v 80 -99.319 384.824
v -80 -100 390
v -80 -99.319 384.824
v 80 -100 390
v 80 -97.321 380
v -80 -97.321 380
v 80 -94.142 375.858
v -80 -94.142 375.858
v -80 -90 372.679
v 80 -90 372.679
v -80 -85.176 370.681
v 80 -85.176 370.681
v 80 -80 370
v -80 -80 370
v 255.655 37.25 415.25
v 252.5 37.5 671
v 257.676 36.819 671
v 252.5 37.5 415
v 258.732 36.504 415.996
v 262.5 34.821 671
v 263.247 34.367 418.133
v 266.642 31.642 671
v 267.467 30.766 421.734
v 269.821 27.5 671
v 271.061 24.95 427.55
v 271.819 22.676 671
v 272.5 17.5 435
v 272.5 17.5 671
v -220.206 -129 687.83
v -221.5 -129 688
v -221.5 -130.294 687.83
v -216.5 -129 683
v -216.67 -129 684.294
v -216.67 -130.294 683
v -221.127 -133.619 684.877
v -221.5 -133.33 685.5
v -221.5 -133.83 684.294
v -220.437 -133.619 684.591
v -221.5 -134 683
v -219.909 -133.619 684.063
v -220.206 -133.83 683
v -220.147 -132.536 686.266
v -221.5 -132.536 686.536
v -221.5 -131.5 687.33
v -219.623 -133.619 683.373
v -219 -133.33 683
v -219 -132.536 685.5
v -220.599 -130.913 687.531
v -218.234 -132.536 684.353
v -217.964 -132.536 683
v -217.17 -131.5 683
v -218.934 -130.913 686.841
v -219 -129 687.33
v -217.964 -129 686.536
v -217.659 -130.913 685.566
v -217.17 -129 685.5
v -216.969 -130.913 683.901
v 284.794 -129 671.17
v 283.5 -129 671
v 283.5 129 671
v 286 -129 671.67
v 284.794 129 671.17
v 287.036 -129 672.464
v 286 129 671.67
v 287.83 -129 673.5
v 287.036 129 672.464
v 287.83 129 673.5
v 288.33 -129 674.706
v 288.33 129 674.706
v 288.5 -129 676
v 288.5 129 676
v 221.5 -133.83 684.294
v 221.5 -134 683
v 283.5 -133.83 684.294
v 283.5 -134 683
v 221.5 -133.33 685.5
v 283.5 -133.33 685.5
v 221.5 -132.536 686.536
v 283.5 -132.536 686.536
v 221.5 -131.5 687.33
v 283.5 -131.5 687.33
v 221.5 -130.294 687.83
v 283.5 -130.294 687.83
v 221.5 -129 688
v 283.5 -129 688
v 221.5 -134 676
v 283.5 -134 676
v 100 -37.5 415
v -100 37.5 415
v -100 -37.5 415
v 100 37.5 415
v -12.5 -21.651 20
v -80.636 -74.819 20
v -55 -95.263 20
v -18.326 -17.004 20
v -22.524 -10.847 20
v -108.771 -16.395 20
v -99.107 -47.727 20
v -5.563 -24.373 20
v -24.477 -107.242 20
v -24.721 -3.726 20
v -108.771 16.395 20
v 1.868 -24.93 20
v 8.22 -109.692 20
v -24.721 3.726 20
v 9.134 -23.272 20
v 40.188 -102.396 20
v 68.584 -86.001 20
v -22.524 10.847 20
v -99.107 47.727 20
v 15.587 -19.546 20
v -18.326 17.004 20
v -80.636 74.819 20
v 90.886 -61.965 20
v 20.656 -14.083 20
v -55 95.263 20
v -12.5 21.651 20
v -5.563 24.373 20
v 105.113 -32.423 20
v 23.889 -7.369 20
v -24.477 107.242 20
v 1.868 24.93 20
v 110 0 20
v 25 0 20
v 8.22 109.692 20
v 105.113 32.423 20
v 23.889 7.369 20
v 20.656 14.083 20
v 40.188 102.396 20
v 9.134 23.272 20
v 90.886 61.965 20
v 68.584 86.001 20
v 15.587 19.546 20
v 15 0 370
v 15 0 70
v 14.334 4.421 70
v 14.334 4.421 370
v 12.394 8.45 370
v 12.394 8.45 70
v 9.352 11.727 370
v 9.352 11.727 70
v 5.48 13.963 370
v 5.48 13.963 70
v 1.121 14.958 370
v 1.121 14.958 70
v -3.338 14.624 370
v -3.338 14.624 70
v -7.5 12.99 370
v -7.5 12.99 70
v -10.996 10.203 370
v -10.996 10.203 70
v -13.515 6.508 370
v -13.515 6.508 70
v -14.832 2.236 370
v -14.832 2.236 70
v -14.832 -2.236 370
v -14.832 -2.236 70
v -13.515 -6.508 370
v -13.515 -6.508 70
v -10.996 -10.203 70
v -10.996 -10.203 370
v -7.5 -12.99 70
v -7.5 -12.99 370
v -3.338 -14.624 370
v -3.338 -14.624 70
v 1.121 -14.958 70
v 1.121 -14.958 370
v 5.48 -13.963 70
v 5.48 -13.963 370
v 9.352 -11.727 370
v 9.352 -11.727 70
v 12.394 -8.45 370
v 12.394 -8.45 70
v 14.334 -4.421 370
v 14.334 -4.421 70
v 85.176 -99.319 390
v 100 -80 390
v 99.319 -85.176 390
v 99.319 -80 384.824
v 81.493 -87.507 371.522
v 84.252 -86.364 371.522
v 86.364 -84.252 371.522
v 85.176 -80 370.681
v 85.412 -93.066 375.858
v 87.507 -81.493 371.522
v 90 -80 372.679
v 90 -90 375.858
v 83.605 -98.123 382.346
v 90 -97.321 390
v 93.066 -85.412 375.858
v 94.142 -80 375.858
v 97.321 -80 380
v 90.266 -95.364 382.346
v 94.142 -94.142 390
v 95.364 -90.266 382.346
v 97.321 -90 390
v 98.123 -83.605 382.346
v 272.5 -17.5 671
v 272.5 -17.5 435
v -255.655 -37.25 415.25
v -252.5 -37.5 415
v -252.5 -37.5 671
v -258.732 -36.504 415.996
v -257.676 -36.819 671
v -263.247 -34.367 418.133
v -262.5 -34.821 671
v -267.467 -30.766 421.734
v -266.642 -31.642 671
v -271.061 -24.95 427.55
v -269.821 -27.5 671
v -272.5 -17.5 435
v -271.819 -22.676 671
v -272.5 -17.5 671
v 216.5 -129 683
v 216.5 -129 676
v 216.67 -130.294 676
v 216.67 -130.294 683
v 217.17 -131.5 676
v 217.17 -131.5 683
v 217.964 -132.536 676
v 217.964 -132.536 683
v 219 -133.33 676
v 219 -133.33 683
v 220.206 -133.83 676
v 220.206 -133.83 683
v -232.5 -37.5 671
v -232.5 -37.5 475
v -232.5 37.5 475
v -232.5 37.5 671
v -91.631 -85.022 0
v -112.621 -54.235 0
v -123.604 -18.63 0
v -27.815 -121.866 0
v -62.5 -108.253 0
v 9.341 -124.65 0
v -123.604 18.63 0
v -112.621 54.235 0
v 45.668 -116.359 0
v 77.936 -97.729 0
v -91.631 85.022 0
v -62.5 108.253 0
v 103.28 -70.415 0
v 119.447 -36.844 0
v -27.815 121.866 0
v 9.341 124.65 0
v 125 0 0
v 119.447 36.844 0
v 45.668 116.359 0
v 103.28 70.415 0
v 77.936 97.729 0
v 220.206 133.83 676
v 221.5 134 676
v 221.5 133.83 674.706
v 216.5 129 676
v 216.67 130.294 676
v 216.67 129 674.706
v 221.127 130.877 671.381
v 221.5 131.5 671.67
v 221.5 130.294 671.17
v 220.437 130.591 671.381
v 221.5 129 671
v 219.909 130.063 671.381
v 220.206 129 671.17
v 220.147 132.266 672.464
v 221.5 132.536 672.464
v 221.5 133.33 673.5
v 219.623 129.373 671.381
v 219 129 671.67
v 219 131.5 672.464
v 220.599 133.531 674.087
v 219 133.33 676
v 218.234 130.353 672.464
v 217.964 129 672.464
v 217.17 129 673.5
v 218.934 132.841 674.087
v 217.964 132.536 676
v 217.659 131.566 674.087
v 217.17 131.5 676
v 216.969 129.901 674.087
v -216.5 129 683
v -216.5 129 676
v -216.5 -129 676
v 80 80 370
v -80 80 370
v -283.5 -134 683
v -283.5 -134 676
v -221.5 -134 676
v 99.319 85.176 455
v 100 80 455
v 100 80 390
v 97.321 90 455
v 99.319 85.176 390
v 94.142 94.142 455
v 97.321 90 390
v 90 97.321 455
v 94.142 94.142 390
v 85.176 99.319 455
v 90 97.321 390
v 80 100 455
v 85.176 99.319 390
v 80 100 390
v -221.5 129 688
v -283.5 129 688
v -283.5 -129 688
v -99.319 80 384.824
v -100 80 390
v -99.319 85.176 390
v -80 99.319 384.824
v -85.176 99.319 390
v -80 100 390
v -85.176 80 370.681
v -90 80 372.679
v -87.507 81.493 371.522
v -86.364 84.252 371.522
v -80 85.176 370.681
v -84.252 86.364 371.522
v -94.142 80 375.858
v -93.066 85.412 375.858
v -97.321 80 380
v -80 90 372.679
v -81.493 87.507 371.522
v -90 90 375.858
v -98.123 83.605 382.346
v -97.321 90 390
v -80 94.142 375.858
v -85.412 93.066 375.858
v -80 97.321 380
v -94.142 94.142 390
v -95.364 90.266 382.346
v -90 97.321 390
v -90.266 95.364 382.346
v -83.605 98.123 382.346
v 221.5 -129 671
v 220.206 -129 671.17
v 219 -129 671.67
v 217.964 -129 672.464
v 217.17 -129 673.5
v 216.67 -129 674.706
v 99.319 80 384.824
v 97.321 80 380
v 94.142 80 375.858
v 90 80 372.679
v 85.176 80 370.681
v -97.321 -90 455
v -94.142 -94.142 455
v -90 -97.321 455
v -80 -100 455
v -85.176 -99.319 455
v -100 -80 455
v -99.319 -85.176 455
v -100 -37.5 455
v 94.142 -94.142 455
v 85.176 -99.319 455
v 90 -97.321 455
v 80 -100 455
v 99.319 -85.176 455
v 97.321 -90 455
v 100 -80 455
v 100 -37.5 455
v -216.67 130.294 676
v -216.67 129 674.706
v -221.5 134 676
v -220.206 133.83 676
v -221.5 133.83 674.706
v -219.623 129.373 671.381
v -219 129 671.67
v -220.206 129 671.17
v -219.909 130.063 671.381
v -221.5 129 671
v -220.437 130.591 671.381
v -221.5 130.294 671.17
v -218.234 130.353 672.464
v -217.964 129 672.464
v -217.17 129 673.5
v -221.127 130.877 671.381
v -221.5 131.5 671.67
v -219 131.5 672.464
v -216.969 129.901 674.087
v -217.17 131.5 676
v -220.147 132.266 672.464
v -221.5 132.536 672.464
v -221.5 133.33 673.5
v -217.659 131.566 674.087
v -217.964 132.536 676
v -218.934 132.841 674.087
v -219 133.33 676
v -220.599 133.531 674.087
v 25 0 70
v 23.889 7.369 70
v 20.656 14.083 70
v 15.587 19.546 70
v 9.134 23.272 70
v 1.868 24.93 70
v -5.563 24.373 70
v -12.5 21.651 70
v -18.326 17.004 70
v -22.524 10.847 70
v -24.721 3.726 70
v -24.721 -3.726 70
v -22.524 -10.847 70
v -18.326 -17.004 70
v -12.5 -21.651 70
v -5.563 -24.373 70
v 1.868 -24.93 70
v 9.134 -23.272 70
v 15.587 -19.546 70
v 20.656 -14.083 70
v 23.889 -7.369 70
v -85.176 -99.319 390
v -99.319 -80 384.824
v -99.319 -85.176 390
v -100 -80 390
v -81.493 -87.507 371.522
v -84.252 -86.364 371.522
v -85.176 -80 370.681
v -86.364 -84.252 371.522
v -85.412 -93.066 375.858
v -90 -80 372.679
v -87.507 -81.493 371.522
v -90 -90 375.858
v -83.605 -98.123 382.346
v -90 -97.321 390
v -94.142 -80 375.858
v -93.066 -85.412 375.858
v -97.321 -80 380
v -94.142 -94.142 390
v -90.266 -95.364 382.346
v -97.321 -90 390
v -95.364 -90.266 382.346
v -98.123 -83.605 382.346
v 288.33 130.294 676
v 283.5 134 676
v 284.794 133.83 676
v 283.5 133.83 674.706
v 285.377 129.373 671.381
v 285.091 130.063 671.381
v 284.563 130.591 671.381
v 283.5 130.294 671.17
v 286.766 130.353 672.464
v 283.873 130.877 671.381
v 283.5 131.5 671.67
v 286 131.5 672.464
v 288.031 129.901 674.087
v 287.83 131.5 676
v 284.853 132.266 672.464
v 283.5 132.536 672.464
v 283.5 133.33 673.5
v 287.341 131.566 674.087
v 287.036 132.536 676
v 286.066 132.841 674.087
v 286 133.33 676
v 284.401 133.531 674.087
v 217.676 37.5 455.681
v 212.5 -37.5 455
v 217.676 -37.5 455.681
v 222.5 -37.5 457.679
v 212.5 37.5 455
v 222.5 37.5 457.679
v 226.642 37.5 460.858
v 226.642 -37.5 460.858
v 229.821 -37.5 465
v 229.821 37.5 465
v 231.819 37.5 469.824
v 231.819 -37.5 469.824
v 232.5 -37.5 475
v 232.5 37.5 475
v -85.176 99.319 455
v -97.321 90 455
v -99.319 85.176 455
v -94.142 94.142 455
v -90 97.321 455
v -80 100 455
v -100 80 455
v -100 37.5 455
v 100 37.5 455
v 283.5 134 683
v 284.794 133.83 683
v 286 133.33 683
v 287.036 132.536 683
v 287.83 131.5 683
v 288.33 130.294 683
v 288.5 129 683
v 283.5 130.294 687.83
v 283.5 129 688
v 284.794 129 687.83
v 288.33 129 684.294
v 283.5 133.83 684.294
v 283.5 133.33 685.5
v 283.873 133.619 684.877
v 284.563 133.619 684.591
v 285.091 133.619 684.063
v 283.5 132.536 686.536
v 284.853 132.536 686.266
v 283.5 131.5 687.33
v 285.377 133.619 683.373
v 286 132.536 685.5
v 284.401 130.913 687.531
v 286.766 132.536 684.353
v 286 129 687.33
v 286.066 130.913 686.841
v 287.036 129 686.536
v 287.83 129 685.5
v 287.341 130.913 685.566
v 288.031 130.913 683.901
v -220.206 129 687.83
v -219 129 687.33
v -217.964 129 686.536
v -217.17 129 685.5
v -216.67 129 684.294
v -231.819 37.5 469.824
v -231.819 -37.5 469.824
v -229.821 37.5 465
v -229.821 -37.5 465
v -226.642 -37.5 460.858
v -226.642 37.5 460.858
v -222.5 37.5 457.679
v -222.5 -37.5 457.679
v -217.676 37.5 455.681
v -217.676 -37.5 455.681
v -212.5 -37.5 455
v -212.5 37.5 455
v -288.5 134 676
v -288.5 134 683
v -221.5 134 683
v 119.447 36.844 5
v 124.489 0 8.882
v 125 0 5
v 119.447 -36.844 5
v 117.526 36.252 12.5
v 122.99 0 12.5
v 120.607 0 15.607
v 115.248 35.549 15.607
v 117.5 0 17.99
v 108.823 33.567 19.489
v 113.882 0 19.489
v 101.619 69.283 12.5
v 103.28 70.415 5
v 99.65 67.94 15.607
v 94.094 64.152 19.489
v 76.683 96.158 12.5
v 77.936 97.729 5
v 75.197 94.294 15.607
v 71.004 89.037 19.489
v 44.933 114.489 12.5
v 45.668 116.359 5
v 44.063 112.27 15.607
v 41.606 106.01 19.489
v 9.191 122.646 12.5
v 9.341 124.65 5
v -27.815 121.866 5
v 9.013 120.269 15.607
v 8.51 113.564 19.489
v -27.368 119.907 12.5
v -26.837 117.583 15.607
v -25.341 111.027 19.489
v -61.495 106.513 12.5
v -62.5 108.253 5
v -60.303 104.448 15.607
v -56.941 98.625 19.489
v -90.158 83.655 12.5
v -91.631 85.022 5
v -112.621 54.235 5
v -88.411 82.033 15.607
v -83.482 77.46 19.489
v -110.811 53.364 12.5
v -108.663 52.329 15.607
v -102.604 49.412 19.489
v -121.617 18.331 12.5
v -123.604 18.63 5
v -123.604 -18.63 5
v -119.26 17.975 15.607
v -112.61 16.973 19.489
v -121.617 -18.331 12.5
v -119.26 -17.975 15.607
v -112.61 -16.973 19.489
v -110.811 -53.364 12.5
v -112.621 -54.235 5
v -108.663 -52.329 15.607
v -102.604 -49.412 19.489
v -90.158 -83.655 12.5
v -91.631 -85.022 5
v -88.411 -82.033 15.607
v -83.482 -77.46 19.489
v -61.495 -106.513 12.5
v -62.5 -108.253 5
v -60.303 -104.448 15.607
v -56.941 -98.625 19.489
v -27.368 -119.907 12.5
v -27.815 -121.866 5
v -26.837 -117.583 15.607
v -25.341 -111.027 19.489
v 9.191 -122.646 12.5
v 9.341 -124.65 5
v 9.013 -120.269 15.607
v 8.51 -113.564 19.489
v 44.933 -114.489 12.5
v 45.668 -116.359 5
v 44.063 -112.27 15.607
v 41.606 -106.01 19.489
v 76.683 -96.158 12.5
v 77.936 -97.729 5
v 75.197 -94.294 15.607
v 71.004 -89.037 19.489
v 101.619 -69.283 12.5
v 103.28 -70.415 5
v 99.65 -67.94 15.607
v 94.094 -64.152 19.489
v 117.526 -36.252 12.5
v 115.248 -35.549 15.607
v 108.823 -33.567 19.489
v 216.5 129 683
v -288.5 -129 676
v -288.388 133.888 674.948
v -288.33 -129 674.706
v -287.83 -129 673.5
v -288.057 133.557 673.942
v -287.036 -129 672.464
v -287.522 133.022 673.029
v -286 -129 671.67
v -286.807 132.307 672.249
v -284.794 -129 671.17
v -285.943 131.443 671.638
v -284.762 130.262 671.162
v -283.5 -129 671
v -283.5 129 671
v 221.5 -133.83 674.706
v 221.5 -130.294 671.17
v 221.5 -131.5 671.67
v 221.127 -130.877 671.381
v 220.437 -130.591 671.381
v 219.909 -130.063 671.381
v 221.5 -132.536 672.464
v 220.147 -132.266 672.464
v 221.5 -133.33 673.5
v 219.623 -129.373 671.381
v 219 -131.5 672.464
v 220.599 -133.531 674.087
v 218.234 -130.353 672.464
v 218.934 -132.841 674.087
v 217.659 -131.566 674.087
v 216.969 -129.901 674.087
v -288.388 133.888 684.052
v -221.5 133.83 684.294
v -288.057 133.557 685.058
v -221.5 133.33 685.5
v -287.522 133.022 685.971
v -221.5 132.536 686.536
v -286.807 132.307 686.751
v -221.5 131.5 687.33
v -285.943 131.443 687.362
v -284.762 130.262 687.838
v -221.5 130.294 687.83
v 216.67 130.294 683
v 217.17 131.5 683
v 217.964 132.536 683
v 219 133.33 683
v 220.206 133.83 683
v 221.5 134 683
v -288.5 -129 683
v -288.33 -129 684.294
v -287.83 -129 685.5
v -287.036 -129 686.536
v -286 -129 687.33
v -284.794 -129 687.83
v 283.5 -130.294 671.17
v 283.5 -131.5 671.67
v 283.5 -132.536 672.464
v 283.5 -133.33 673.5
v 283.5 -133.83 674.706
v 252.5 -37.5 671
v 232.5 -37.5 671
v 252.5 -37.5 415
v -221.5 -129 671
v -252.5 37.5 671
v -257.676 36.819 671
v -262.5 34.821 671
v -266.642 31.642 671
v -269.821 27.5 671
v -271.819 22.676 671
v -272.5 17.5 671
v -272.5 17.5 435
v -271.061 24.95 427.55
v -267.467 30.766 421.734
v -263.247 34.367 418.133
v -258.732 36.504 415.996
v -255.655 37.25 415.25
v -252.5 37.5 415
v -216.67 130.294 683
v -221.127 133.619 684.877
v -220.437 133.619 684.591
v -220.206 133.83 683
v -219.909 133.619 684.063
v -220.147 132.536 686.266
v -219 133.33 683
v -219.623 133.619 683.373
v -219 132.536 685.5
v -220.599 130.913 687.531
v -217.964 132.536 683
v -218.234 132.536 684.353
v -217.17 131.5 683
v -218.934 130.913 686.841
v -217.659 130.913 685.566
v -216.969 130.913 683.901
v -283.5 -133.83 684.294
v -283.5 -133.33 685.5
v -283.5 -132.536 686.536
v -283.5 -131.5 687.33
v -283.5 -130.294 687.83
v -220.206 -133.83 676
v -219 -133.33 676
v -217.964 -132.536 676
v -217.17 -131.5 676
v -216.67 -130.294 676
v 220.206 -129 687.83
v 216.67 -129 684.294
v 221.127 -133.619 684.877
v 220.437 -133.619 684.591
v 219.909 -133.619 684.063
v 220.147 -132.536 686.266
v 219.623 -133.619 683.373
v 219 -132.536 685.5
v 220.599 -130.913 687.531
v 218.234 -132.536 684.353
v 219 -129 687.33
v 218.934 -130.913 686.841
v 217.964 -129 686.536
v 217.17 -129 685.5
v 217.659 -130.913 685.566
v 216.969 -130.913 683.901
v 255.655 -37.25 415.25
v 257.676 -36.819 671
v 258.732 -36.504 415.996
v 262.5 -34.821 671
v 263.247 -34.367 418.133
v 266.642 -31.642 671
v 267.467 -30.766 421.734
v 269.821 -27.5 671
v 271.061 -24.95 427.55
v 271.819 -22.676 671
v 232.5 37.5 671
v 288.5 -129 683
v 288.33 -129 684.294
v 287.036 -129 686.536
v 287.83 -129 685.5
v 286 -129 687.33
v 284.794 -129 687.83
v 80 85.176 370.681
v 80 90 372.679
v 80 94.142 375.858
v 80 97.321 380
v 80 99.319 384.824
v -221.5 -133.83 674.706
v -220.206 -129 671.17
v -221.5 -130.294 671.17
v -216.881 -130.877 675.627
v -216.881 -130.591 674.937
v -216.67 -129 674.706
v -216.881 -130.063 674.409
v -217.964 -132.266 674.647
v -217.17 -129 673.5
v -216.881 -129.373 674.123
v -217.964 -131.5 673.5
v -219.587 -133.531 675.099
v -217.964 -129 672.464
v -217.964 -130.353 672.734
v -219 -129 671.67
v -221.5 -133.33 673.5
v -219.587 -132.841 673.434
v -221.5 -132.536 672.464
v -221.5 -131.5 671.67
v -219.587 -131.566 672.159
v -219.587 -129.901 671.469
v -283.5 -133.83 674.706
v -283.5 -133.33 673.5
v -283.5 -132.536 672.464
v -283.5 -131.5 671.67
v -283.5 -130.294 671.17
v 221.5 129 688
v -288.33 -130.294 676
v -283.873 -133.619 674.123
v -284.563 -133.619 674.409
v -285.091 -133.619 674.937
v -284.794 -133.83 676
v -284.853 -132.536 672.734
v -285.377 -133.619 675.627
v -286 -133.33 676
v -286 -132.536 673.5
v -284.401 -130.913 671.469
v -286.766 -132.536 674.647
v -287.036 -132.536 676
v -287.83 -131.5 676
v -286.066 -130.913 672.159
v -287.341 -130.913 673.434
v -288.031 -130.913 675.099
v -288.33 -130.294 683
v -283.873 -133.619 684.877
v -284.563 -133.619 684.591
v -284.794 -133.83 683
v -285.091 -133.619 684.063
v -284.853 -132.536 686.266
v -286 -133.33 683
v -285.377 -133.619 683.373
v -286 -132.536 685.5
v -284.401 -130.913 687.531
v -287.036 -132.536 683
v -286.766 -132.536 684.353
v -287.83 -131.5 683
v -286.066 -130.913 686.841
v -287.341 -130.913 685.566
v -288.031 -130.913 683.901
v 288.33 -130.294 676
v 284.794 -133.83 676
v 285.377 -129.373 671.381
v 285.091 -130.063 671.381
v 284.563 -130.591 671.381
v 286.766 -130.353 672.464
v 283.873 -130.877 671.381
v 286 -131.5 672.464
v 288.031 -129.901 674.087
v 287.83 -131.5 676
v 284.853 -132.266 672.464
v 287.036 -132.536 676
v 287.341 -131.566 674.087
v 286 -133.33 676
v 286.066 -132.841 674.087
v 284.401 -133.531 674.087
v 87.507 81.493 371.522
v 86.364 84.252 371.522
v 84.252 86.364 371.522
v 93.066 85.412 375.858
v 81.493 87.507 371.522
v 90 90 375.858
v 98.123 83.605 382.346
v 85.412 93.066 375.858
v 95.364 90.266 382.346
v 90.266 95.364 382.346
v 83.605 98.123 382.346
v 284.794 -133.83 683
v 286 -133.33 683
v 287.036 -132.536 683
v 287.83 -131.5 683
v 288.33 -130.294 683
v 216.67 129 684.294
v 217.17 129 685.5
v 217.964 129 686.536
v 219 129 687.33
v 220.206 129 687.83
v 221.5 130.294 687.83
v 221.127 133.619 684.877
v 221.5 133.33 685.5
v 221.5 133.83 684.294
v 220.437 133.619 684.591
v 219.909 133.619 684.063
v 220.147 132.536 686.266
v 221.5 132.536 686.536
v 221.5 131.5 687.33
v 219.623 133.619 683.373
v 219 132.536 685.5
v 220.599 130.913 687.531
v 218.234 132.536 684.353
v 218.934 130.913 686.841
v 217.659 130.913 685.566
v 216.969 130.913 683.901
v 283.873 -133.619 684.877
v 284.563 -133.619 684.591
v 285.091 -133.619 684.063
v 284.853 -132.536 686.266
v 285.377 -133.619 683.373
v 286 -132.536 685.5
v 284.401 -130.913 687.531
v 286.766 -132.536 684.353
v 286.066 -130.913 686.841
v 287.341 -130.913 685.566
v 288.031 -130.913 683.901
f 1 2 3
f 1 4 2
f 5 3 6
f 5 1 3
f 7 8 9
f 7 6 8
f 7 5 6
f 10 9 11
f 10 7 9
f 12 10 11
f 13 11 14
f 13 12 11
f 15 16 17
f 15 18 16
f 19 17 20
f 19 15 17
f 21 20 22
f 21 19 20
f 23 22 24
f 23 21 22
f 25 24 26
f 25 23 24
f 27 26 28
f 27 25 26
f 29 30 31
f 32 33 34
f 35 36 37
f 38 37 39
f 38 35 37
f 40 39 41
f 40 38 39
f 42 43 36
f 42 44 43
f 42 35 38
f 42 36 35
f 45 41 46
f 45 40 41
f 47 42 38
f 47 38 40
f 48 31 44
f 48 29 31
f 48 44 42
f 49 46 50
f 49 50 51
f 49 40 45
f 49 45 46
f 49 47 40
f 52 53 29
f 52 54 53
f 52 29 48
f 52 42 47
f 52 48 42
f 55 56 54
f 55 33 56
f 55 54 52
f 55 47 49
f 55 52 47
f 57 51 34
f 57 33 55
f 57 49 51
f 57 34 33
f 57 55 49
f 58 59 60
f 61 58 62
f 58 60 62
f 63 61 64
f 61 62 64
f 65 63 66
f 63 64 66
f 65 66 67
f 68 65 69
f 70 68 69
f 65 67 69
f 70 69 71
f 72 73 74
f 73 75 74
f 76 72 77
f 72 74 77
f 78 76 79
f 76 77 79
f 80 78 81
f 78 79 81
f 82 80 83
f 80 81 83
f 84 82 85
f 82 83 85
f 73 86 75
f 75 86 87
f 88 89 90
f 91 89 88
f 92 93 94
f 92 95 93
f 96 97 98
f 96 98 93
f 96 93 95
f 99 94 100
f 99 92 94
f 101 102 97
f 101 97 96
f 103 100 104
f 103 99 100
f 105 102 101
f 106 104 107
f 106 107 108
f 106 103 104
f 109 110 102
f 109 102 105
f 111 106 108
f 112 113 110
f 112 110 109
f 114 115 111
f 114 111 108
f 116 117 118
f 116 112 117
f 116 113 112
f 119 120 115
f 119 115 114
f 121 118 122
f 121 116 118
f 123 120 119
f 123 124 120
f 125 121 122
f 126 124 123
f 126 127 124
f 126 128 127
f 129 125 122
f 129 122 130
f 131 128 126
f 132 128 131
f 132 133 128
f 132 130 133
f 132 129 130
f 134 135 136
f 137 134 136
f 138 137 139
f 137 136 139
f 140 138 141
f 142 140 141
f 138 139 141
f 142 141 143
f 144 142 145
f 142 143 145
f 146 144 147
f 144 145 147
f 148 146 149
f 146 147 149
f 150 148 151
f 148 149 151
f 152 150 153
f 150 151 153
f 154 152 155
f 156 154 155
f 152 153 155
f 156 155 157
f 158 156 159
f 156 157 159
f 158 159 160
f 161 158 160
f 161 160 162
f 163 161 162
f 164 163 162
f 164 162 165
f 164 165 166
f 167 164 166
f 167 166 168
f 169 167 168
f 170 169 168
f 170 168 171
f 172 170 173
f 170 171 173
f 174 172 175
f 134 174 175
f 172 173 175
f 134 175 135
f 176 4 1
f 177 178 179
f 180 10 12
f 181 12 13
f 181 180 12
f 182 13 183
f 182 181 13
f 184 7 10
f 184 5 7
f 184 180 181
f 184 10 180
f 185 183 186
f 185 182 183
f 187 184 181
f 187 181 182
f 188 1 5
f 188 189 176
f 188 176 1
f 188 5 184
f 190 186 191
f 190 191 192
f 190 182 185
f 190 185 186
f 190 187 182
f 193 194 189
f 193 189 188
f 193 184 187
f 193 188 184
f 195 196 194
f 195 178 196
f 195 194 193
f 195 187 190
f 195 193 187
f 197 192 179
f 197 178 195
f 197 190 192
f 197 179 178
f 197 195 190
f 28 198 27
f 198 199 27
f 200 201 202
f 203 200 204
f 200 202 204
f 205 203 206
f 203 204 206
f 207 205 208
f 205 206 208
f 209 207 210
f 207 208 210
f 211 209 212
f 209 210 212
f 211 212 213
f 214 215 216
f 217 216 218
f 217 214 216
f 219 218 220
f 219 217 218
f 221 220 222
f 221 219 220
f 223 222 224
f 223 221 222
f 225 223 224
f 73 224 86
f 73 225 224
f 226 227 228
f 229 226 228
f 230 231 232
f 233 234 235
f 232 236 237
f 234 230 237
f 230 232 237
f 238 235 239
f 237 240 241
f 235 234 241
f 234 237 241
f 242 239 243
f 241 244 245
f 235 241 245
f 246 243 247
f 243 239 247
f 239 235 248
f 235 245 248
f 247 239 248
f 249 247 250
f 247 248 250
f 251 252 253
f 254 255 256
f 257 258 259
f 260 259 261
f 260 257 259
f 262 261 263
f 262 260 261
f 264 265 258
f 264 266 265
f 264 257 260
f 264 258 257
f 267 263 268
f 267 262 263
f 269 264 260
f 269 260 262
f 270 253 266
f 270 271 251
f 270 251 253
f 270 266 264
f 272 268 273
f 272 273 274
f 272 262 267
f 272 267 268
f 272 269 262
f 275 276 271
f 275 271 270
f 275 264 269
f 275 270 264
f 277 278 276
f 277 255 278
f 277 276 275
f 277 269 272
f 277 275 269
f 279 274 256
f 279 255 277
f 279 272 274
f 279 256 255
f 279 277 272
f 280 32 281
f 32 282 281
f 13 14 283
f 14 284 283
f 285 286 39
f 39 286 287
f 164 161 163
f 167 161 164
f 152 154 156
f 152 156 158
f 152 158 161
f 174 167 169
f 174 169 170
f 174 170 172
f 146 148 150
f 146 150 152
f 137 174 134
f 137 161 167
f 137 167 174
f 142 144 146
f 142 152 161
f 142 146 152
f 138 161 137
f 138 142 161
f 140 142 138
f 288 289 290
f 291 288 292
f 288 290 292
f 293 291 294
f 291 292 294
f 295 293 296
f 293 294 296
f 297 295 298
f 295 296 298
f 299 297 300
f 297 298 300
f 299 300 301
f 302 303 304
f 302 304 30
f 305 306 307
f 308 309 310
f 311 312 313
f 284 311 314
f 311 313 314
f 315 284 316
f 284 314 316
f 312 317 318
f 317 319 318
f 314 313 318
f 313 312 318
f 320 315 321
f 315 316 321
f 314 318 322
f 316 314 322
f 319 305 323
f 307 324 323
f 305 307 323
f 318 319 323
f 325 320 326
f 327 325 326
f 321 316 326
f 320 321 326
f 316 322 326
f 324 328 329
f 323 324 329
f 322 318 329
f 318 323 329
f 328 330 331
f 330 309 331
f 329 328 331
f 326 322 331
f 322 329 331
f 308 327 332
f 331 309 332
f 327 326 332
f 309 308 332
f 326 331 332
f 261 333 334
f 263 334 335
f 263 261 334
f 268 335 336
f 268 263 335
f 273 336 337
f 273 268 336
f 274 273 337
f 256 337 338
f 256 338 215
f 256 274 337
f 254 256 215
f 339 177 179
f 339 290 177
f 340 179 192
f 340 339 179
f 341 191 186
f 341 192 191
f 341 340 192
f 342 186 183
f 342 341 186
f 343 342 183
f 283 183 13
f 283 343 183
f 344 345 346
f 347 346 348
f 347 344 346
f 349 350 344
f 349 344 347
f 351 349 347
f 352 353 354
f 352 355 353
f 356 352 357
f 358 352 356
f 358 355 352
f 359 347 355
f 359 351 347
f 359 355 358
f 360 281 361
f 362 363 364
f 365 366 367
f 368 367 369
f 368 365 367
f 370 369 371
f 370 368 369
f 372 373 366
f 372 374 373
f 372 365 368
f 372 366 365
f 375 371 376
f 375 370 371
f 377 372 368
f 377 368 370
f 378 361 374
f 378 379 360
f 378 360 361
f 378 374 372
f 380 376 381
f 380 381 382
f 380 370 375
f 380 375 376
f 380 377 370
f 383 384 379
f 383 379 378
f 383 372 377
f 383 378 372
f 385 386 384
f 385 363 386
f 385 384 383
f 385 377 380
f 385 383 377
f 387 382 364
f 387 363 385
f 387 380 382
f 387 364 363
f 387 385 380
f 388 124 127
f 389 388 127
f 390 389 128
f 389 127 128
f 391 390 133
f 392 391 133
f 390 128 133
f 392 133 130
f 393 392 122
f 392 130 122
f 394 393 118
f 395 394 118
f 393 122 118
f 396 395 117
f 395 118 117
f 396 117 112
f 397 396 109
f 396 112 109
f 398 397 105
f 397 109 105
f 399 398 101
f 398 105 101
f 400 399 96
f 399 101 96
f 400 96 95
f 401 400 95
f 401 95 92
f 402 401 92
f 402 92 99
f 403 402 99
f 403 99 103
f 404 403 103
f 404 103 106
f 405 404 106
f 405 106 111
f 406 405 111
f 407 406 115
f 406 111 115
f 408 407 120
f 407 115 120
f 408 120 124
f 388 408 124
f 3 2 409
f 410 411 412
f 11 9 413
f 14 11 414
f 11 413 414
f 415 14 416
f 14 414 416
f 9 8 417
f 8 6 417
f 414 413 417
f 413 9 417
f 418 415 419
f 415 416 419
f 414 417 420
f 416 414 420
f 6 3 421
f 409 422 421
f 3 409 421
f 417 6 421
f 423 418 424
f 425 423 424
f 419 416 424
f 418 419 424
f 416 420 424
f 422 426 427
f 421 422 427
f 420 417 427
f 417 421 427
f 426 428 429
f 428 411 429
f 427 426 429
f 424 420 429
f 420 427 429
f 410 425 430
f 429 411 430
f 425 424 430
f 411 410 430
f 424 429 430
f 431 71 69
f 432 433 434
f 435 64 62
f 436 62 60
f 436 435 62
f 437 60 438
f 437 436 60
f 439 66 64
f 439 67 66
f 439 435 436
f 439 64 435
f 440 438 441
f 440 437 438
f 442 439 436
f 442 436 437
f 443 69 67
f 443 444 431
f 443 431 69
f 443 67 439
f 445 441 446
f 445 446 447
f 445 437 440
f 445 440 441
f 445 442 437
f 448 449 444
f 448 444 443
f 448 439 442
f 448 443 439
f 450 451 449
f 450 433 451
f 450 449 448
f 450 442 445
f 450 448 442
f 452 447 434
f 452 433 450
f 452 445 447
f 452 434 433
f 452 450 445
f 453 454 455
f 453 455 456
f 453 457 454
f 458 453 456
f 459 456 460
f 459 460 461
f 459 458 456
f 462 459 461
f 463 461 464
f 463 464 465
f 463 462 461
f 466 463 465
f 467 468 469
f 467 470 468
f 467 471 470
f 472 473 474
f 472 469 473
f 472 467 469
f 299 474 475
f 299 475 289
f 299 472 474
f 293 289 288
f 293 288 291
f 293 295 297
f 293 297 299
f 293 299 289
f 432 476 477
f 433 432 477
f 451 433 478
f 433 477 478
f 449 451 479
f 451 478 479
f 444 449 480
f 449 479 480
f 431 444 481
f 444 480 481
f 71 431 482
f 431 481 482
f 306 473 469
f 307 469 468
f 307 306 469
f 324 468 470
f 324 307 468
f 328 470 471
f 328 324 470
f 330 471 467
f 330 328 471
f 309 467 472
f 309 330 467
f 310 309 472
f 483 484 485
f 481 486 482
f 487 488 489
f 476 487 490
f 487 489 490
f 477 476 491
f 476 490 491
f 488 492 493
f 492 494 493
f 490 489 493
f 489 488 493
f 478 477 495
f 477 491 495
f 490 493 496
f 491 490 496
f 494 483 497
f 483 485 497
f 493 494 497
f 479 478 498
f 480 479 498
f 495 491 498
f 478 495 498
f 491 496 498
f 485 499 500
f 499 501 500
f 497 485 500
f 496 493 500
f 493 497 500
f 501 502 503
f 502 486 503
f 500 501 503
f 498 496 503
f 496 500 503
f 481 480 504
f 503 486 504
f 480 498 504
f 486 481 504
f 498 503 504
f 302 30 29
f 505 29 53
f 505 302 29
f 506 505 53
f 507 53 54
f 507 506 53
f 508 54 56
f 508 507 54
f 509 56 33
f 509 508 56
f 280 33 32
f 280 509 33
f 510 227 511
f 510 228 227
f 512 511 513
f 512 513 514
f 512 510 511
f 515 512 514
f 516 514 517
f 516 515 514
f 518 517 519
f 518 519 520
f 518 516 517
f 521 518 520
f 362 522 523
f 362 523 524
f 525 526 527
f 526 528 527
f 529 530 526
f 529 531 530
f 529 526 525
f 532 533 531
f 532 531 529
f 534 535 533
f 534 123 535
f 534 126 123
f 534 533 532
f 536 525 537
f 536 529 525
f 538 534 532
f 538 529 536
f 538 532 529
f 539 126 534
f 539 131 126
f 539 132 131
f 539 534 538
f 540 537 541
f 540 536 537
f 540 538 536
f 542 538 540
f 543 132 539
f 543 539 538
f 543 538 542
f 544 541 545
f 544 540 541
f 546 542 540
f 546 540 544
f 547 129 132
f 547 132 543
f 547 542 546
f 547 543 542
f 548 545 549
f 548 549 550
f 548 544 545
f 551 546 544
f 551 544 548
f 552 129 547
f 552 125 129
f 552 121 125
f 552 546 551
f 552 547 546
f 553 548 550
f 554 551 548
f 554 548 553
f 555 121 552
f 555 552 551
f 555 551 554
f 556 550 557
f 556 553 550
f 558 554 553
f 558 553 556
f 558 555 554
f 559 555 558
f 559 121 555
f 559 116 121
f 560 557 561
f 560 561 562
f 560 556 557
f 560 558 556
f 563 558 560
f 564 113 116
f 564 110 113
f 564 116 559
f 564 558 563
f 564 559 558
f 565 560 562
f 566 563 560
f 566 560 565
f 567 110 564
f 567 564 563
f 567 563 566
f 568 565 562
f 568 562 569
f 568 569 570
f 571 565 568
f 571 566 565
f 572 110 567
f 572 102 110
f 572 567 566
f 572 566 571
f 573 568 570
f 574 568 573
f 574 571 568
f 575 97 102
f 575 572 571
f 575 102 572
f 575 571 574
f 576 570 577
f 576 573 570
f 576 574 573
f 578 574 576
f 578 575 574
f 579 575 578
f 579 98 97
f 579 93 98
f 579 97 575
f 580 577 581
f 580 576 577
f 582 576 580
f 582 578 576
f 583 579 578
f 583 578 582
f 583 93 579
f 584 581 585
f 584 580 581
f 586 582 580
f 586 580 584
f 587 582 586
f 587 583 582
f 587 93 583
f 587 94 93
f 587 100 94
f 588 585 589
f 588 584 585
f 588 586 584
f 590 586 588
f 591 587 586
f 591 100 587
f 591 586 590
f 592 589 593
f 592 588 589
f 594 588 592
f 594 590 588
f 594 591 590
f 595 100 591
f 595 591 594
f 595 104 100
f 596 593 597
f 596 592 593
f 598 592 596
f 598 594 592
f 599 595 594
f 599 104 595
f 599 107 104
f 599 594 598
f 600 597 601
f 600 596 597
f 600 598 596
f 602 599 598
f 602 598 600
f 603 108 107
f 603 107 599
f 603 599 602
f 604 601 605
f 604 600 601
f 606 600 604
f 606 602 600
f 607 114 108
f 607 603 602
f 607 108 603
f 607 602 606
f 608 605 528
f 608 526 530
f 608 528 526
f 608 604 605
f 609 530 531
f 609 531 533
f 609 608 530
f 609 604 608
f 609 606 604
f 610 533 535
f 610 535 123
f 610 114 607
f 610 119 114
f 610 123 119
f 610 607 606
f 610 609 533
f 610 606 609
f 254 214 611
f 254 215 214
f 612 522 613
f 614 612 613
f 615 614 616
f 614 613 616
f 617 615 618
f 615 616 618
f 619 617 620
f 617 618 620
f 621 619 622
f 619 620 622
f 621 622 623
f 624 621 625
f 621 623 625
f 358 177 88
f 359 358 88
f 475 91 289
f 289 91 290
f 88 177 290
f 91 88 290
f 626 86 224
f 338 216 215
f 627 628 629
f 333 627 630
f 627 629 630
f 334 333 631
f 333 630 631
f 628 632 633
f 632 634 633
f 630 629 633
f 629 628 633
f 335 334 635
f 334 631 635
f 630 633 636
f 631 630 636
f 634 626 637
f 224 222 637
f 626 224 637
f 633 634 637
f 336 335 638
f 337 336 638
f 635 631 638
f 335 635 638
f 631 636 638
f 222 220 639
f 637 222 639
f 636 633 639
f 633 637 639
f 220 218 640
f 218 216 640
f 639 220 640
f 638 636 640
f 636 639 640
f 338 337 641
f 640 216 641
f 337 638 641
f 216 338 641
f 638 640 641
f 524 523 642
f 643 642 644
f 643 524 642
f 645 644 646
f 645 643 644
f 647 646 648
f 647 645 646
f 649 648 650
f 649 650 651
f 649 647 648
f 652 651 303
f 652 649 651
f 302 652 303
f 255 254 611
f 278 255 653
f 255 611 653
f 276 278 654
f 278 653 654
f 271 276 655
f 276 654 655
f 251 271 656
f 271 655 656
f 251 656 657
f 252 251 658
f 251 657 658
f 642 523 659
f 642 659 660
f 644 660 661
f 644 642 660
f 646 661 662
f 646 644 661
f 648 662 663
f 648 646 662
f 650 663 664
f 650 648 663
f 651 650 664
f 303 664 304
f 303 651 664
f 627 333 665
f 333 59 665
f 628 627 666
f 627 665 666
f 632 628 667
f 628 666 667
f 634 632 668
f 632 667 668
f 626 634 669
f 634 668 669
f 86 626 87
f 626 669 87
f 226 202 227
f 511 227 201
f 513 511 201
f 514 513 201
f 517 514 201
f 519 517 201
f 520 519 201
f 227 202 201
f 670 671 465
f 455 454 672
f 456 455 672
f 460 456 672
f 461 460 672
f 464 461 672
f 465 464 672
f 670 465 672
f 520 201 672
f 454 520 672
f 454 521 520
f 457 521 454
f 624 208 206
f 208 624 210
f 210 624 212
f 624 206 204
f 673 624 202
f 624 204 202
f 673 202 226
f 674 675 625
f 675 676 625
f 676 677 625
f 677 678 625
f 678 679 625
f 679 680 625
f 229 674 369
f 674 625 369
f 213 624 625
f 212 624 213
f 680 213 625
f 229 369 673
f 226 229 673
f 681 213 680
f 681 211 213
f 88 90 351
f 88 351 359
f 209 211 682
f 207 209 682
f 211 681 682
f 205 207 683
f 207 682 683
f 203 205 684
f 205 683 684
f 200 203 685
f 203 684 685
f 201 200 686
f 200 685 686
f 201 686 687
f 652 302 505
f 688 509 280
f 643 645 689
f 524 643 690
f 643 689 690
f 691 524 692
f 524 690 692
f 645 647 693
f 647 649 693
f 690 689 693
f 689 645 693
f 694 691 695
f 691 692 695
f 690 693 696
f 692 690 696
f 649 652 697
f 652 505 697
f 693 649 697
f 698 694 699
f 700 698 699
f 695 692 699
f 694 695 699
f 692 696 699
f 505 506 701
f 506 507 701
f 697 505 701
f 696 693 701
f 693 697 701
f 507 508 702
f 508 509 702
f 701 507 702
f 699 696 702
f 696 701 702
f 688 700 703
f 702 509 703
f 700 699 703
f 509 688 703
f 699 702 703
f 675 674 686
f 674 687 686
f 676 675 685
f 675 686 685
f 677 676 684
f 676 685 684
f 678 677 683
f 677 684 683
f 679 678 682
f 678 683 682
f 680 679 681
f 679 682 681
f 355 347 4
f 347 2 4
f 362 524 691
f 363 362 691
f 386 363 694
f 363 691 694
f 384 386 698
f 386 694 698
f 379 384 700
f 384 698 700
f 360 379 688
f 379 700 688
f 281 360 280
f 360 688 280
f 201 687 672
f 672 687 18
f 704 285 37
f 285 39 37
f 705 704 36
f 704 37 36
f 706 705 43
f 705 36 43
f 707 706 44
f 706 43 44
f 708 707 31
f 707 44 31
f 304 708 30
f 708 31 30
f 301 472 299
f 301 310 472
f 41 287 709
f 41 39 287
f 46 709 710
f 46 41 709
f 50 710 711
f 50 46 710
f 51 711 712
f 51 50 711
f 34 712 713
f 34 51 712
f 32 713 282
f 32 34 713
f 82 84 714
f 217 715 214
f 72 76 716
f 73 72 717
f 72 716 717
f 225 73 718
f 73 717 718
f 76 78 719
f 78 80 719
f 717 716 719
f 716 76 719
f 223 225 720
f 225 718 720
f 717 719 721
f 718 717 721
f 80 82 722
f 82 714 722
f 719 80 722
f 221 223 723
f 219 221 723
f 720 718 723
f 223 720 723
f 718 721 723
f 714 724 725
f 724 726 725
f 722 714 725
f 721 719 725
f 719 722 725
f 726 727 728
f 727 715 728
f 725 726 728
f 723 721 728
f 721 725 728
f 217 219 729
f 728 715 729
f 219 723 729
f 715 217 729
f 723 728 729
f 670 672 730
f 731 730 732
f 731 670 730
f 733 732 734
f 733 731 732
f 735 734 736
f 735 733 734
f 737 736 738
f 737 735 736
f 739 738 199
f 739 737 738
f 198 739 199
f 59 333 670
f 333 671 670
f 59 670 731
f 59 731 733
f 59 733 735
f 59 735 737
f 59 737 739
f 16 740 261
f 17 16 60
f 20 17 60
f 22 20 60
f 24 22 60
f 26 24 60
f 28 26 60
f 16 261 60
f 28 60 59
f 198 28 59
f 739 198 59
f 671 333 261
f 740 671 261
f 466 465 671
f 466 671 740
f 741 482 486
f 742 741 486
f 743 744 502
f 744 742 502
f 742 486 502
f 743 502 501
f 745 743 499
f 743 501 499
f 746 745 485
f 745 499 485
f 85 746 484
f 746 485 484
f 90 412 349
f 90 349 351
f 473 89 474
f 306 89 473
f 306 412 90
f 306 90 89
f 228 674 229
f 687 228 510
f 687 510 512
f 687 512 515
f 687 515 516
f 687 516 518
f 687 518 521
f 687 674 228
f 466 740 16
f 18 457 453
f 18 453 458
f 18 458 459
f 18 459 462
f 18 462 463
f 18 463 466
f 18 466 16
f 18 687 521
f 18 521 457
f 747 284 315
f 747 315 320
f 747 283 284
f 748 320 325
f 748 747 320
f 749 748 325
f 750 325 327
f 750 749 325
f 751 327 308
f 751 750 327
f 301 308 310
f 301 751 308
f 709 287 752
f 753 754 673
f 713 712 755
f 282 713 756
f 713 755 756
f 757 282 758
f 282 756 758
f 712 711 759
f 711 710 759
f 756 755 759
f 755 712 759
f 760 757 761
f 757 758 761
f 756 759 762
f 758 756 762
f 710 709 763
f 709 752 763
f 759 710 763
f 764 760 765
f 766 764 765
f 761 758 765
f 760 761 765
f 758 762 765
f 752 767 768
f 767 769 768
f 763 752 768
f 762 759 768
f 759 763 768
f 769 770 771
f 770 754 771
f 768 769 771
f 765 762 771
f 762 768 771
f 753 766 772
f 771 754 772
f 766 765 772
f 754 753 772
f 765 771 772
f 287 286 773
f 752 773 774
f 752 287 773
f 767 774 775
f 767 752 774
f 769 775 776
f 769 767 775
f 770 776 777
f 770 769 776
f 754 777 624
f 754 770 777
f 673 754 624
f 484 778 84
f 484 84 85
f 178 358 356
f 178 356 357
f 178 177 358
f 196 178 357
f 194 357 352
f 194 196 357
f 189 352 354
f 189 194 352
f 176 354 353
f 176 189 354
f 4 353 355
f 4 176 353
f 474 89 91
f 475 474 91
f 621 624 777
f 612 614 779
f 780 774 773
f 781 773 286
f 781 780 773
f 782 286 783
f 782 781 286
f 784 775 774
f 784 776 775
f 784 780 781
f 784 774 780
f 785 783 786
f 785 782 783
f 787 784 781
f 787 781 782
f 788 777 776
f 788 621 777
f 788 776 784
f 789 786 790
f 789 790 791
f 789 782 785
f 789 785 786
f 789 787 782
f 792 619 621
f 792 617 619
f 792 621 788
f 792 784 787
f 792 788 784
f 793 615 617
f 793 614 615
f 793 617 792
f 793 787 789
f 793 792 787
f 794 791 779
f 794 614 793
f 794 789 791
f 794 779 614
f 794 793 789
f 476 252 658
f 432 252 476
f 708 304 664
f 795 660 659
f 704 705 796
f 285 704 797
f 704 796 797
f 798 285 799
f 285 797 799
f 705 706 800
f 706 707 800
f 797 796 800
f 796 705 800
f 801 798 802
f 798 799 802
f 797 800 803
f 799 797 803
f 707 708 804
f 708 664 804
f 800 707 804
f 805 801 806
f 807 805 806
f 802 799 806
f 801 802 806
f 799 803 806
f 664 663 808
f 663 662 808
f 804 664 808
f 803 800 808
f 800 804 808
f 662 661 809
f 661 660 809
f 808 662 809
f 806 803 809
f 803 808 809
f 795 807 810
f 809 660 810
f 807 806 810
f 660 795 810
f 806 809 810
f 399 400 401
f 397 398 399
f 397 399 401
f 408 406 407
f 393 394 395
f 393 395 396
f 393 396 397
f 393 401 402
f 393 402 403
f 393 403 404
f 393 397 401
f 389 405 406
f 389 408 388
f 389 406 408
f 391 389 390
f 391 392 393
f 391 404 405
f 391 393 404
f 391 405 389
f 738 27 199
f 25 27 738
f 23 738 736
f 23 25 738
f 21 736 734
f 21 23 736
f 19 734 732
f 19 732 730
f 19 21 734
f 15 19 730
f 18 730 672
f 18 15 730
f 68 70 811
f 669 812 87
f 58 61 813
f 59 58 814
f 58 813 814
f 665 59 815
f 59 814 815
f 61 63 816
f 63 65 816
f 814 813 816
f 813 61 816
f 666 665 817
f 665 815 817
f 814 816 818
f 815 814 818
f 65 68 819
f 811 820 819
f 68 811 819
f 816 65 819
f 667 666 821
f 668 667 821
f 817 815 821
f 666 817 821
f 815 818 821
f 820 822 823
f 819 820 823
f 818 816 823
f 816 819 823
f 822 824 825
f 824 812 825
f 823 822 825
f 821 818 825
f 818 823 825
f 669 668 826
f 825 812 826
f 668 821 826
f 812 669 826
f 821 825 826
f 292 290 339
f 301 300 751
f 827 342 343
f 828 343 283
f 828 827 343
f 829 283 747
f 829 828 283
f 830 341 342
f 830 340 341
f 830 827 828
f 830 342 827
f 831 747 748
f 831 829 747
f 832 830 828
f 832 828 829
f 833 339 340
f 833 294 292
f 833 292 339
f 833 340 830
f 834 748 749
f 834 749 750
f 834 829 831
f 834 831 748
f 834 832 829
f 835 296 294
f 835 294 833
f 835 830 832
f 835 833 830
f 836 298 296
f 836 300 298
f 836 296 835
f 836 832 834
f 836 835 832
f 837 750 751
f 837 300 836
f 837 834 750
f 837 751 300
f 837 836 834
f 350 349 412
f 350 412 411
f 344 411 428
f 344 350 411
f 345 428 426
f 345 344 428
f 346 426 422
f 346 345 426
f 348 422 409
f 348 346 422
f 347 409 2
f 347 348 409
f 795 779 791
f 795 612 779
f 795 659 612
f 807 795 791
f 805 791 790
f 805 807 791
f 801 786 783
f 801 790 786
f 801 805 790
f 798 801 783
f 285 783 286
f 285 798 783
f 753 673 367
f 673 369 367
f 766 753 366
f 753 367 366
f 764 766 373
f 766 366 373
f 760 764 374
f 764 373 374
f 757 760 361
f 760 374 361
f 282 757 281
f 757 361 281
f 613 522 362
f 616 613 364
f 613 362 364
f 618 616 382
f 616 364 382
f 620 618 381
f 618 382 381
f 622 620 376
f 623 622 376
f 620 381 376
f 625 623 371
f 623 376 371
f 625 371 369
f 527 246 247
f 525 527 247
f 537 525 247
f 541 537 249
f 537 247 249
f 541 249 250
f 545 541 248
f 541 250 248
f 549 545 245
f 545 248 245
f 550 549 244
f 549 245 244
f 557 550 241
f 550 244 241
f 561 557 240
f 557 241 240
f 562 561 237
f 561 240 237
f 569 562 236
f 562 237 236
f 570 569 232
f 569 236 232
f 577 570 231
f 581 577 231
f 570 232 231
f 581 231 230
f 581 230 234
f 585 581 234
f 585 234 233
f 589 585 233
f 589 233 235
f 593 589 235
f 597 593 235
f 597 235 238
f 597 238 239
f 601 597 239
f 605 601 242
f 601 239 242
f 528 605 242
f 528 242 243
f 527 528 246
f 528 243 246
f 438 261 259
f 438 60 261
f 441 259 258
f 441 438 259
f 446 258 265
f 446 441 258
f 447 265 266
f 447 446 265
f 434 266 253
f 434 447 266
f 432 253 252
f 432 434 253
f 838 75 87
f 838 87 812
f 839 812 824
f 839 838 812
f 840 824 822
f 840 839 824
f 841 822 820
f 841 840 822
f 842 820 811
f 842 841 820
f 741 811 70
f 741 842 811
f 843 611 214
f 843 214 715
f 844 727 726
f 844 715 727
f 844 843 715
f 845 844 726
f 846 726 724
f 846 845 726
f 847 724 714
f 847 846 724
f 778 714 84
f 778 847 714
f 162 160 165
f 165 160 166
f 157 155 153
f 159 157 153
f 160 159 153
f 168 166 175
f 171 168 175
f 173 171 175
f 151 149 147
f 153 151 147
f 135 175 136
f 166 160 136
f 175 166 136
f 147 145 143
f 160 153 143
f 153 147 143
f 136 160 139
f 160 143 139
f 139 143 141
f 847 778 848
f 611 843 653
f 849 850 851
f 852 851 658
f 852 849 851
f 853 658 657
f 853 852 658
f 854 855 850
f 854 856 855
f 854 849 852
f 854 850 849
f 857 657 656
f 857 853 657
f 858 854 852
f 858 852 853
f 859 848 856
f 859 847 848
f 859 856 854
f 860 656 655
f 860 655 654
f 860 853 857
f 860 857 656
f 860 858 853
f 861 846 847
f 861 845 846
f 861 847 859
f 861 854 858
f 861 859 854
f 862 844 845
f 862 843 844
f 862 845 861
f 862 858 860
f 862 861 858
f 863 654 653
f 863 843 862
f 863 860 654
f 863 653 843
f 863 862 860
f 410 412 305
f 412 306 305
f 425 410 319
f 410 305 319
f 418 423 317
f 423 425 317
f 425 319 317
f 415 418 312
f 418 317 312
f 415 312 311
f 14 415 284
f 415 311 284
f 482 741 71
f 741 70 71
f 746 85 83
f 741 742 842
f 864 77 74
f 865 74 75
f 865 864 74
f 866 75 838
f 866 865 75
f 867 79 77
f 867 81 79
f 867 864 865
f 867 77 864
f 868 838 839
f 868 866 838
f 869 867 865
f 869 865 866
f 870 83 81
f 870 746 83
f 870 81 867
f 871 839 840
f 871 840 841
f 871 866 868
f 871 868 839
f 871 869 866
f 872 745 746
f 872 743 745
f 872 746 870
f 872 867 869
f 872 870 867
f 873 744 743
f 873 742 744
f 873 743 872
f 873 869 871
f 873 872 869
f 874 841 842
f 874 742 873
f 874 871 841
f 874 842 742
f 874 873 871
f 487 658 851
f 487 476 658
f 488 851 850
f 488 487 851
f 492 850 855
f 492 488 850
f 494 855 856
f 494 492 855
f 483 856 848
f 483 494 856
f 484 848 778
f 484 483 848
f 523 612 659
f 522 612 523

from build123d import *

# Parameters (mm, degrees)
SKETCH_R     = 125
PAD_DEPTH    = 20
SKETCH001_R  = 25
PAD001_DEPTH = 50
FILLET006_R  = 15
SKETCH002_R  = 15
PAD002_DEPTH = 300
SKETCH003_W  = 200
SKETCH003_H  = 200
PAD003_DEPTH = 45
SKETCH009_W  = 200
SKETCH009_H  = 62.5
PAD009_DEPTH = 40
FILLET005_R  = 20
SKETCH004_W  = 545
SKETCH004_H  = 75
PAD004_DEPTH = 40
SKETCH005_W  = 40
SKETCH005_H  = 75
PAD005_DEPTH = 216
SKETCH006_W  = 72
SKETCH006_H  = 268
PAD006_DEPTH = 17
FILLET003_R  = 5
FILLET004_R  = 20


with BuildPart() as body1:
    # Sketch → Pad (new body)
    with BuildSketch(Plane.XY):
        Circle(SKETCH_R)
    extrude(amount=PAD_DEPTH)

    # Sketch001 (on Face3 of Pad) → Pad001 (join)
    with BuildSketch(Plane.XY.offset(20)):
        Circle(SKETCH001_R)
    extrude(amount=PAD001_DEPTH)

    # Fillet006
    fillet006_edges = [body1.edges().sort_by_distance(p)[0] for p in [
        (-125, 0, 20),
    ]]
    fillet(fillet006_edges, radius=FILLET006_R)


with BuildPart() as body2:
    # Sketch002 (on CopyPad) → Pad002 (new body)
    with BuildSketch(Plane.XY.offset(70)):
        Circle(SKETCH002_R)
    extrude(amount=PAD002_DEPTH)


with BuildPart() as body3:
    # Sketch003 (on Face1 of CopyPad002) → Pad003 (new body)
    with BuildSketch(Plane.XY.offset(370)):
        Rectangle(SKETCH003_W, SKETCH003_H)
    extrude(amount=PAD003_DEPTH)

    # Sketch009 (on Face6 of Pad003) → Pad009 (join)
    with BuildSketch(Plane.XY.offset(415)):
        with Locations((0, 68.75)):
            Rectangle(SKETCH009_W, SKETCH009_H)
        with Locations((0, -68.75)):
            Rectangle(SKETCH009_W, SKETCH009_H)
    extrude(amount=PAD009_DEPTH)

    # Fillet005
    fillet005_edges = [body3.edges().sort_by_distance(p)[0] for p in [
        (-100, -100, 412.5),
        (100, -100, 412.5),
        (100, 100, 412.5),
        (-100, 100, 412.5),
        (0, -100, 370),
        (100, 0, 370),
        (-100, 0, 370),
        (0, 100, 370),
    ]]
    fillet(fillet005_edges, radius=FILLET005_R)


with BuildPart() as body4:
    # Sketch004 (on Face1 of CopyPad003) → Pad004 (new body)
    with BuildSketch(Plane.XY.offset(415)):
        Rectangle(SKETCH004_W, SKETCH004_H)
    extrude(amount=PAD004_DEPTH)

    # Sketch005 (on Face6 of Pad004) → Pad005 (join)
    with BuildSketch(Plane.XY.offset(455)):
        with Locations((-252.5, 0)):
            Rectangle(SKETCH005_W, SKETCH005_H)
        with Locations((252.5, 0)):
            Rectangle(SKETCH005_W, SKETCH005_H)
    extrude(amount=PAD005_DEPTH)

    # Sketch006 (on Face5 of Pad005) → Pad006 (join)
    with BuildSketch(Plane.XY.offset(671)):
        with Locations((-252.5, 0)):
            Rectangle(SKETCH006_W, SKETCH006_H)
        with Locations((252.5, 0)):
            Rectangle(SKETCH006_W, SKETCH006_H)
    extrude(amount=PAD006_DEPTH)

    # Fillet003
    fillet003_edges = [body4.edges().sort_by_distance(p)[0] for p in [
        (-288.5, 0, 688),
        (-216.5, 0, 688),
        (216.5, 0, 688),
        (288.5, 0, 688),
        (252.5, -134, 688),
        (252.5, 134, 688),
        (-252.5, 134, 688),
        (-252.5, -134, 688),
        (216.5, -134, 679.5),
        (288.5, -134, 679.5),
        (288.5, 134, 679.5),
        (216.5, 134, 679.5),
        (288.5, 0, 671),
        (252.5, 134, 671),
        (252.5, -134, 671),
        (216.5, 0, 671),
        (-288.5, 0, 671),
        (-252.5, -134, 671),
        (-288.5, -134, 679.5),
        (-216.5, -134, 679.5),
        (-216.5, 134, 679.5),
        (-216.5, 0, 671),
        (-252.5, 134, 671),
    ]]
    fillet(fillet003_edges, radius=FILLET003_R)

    # Fillet004
    fillet004_edges = [body4.edges().sort_by_distance(p)[0] for p in [
        (-272.5, 0, 415),
        (-232.5, 0, 455),
        (232.5, 0, 455),
        (272.5, 0, 415),
        (272.5, -37.5, 543),
        (272.5, 37.5, 543),
        (-272.5, -37.5, 543),
        (-272.5, 37.5, 543),
    ]]
    fillet(fillet004_edges, radius=FILLET004_R)


solid = Compound([body1.part, body2.part, body3.part, body4.part])
